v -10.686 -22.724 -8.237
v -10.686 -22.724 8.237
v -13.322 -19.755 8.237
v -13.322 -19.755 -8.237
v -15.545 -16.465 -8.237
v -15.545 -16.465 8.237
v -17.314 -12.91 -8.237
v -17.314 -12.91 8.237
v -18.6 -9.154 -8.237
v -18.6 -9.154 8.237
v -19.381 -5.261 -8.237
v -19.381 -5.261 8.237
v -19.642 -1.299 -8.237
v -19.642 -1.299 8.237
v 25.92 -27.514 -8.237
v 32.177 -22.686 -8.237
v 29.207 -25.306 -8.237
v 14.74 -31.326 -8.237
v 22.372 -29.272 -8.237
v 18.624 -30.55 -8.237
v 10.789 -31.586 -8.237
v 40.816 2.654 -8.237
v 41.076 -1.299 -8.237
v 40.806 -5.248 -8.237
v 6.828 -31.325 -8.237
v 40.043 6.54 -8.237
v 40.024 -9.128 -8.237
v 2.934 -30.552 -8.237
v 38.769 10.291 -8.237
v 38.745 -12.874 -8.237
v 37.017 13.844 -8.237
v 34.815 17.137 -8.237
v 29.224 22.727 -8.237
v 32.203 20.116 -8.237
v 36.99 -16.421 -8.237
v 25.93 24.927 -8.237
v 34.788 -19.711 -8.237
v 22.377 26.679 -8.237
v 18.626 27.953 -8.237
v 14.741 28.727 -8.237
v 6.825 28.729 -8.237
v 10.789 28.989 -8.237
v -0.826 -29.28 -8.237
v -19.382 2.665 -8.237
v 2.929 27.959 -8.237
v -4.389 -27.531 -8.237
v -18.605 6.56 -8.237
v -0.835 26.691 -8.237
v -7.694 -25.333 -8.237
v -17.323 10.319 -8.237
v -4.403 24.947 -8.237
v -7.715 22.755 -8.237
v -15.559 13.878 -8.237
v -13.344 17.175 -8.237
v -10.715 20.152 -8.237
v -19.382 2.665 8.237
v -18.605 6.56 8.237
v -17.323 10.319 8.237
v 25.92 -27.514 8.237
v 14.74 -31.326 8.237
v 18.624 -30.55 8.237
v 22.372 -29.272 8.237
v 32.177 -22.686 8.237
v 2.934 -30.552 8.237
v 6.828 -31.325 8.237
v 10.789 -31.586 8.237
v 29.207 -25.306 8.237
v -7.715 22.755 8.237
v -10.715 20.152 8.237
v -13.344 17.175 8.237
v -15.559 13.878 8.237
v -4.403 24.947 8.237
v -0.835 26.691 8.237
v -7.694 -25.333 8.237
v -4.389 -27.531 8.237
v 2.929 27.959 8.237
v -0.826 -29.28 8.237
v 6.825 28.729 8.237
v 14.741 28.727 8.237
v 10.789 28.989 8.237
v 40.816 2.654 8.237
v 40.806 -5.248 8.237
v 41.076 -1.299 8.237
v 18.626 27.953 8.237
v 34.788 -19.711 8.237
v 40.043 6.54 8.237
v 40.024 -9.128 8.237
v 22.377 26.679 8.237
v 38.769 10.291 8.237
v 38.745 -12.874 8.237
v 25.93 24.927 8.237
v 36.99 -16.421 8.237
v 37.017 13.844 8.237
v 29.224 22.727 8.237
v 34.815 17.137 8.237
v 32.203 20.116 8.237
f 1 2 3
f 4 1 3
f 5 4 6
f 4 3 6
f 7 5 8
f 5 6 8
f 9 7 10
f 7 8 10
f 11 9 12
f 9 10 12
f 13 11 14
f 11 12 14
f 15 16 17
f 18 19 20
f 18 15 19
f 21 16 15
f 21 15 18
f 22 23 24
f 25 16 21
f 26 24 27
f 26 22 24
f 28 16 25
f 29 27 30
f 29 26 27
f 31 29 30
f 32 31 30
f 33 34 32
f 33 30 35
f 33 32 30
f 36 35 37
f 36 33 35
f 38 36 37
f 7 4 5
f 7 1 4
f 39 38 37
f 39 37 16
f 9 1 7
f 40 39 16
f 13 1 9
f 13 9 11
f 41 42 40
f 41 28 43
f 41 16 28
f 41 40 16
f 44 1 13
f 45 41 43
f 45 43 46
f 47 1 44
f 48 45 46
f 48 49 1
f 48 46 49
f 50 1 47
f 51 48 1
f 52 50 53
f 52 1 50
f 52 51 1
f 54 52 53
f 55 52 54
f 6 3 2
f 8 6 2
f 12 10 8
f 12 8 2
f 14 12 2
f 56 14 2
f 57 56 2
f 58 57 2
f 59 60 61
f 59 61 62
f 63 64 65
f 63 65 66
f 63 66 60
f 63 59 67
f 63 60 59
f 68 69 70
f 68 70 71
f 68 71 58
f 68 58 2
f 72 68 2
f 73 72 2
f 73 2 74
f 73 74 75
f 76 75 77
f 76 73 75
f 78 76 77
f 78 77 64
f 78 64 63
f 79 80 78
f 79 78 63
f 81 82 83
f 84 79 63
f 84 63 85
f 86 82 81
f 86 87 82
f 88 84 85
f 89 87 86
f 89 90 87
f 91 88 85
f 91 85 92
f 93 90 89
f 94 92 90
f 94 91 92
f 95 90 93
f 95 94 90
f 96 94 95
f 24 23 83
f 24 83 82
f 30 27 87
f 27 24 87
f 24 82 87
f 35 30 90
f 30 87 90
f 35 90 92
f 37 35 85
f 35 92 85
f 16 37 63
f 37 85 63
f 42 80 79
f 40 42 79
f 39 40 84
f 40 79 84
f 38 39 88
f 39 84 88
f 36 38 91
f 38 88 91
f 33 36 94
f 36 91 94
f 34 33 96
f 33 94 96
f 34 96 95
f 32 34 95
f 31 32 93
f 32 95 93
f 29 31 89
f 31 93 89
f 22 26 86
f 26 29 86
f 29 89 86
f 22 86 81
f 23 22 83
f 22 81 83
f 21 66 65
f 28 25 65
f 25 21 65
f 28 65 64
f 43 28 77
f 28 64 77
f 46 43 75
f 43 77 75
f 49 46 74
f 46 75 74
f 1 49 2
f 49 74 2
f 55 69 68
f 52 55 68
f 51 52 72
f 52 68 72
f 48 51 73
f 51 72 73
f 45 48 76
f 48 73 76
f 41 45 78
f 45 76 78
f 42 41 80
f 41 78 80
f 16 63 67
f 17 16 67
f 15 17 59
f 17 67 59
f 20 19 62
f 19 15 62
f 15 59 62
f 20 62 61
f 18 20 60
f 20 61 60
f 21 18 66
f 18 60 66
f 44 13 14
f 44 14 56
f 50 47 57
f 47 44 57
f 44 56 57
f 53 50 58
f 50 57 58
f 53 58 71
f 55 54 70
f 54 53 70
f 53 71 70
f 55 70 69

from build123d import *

# Parameters (mm, degrees)
F3_W     = 421.7902910393
F3_H     = 198.2180179606
F4_DEPTH = 25.4


# Not quite as in the source:
# - ends of sketch curves that miss each other by under 0.0002 mm in the source are joined


with BuildPart() as f1:
    # F0 (on Front) → F1 (revolve)
    with BuildSketch(Plane.XZ):
        with BuildLine():
            Line((10.5788812285, 8.2366884696), (-24.2557799278, 8.2366884696))
            Line((-24.2557799278, 8.2366884696), (-24.6392214836, 8.2366884696))
            ThreePointArc((-24.6392214836, 8.2366884696), (-32.6864160689, -0.0082121834), (-24.6228011914, -8.2370543))
            Line((-24.6228011914, -8.2370543), (-24.27220022, -8.2370543))
            Line((-24.27220022, -8.2370543), (10.5788812285, -8.2370543))
            Line((10.5788812285, -8.2370543), (10.5788812285, 8.2366884696))
        make_face()
    revolve(axis=Axis((10.5788812285, 0, -0.0001829152), (0, 0, -1)))

    # F3 (on offset) → F4 (cut)
    with BuildSketch(Plane.XY.offset(10)):
        Rectangle(F3_W, F3_H)
        with BuildLine():
            ThreePointArc((-10.7153009133, 20.1523680538), (-0.8347905086, 26.6913979084), (10.7887436299, 28.9885377447))
            ThreePointArc((10.7887436299, 28.9885377447), (22.3773621495, 26.6792950108), (32.203329708, 20.1158334422))
            ThreePointArc((32.203329708, 20.1158334422), (38.769051111, 10.2908037813), (41.0760354322, -1.2987526262))
            ThreePointArc((41.0760354322, -1.2987526262), (38.7450627408, -12.8738402066), (32.1768729102, -22.6858234277))
            ThreePointArc((32.1768729102, -22.6858234277), (22.3718072579, -29.2722876696), (10.7887436292, -31.5860449158))
            ThreePointArc((10.7887436292, -31.5860449158), (-0.8256146846, -29.2802975648), (-10.6861755573, -22.7244524913))
            ThreePointArc((-10.6861755573, -22.7244524913), (-17.3142524075, -12.9103633574), (-19.6419716109, -1.2987526263))
            ThreePointArc((-19.6419716109, -1.2987526263), (-17.3228833961, 10.3191134223), (-10.7153009133, 20.1523680538))
        make_face(mode=Mode.SUBTRACT)
    extrude(amount=-F4_DEPTH, mode=Mode.SUBTRACT)


solid = f1.part
